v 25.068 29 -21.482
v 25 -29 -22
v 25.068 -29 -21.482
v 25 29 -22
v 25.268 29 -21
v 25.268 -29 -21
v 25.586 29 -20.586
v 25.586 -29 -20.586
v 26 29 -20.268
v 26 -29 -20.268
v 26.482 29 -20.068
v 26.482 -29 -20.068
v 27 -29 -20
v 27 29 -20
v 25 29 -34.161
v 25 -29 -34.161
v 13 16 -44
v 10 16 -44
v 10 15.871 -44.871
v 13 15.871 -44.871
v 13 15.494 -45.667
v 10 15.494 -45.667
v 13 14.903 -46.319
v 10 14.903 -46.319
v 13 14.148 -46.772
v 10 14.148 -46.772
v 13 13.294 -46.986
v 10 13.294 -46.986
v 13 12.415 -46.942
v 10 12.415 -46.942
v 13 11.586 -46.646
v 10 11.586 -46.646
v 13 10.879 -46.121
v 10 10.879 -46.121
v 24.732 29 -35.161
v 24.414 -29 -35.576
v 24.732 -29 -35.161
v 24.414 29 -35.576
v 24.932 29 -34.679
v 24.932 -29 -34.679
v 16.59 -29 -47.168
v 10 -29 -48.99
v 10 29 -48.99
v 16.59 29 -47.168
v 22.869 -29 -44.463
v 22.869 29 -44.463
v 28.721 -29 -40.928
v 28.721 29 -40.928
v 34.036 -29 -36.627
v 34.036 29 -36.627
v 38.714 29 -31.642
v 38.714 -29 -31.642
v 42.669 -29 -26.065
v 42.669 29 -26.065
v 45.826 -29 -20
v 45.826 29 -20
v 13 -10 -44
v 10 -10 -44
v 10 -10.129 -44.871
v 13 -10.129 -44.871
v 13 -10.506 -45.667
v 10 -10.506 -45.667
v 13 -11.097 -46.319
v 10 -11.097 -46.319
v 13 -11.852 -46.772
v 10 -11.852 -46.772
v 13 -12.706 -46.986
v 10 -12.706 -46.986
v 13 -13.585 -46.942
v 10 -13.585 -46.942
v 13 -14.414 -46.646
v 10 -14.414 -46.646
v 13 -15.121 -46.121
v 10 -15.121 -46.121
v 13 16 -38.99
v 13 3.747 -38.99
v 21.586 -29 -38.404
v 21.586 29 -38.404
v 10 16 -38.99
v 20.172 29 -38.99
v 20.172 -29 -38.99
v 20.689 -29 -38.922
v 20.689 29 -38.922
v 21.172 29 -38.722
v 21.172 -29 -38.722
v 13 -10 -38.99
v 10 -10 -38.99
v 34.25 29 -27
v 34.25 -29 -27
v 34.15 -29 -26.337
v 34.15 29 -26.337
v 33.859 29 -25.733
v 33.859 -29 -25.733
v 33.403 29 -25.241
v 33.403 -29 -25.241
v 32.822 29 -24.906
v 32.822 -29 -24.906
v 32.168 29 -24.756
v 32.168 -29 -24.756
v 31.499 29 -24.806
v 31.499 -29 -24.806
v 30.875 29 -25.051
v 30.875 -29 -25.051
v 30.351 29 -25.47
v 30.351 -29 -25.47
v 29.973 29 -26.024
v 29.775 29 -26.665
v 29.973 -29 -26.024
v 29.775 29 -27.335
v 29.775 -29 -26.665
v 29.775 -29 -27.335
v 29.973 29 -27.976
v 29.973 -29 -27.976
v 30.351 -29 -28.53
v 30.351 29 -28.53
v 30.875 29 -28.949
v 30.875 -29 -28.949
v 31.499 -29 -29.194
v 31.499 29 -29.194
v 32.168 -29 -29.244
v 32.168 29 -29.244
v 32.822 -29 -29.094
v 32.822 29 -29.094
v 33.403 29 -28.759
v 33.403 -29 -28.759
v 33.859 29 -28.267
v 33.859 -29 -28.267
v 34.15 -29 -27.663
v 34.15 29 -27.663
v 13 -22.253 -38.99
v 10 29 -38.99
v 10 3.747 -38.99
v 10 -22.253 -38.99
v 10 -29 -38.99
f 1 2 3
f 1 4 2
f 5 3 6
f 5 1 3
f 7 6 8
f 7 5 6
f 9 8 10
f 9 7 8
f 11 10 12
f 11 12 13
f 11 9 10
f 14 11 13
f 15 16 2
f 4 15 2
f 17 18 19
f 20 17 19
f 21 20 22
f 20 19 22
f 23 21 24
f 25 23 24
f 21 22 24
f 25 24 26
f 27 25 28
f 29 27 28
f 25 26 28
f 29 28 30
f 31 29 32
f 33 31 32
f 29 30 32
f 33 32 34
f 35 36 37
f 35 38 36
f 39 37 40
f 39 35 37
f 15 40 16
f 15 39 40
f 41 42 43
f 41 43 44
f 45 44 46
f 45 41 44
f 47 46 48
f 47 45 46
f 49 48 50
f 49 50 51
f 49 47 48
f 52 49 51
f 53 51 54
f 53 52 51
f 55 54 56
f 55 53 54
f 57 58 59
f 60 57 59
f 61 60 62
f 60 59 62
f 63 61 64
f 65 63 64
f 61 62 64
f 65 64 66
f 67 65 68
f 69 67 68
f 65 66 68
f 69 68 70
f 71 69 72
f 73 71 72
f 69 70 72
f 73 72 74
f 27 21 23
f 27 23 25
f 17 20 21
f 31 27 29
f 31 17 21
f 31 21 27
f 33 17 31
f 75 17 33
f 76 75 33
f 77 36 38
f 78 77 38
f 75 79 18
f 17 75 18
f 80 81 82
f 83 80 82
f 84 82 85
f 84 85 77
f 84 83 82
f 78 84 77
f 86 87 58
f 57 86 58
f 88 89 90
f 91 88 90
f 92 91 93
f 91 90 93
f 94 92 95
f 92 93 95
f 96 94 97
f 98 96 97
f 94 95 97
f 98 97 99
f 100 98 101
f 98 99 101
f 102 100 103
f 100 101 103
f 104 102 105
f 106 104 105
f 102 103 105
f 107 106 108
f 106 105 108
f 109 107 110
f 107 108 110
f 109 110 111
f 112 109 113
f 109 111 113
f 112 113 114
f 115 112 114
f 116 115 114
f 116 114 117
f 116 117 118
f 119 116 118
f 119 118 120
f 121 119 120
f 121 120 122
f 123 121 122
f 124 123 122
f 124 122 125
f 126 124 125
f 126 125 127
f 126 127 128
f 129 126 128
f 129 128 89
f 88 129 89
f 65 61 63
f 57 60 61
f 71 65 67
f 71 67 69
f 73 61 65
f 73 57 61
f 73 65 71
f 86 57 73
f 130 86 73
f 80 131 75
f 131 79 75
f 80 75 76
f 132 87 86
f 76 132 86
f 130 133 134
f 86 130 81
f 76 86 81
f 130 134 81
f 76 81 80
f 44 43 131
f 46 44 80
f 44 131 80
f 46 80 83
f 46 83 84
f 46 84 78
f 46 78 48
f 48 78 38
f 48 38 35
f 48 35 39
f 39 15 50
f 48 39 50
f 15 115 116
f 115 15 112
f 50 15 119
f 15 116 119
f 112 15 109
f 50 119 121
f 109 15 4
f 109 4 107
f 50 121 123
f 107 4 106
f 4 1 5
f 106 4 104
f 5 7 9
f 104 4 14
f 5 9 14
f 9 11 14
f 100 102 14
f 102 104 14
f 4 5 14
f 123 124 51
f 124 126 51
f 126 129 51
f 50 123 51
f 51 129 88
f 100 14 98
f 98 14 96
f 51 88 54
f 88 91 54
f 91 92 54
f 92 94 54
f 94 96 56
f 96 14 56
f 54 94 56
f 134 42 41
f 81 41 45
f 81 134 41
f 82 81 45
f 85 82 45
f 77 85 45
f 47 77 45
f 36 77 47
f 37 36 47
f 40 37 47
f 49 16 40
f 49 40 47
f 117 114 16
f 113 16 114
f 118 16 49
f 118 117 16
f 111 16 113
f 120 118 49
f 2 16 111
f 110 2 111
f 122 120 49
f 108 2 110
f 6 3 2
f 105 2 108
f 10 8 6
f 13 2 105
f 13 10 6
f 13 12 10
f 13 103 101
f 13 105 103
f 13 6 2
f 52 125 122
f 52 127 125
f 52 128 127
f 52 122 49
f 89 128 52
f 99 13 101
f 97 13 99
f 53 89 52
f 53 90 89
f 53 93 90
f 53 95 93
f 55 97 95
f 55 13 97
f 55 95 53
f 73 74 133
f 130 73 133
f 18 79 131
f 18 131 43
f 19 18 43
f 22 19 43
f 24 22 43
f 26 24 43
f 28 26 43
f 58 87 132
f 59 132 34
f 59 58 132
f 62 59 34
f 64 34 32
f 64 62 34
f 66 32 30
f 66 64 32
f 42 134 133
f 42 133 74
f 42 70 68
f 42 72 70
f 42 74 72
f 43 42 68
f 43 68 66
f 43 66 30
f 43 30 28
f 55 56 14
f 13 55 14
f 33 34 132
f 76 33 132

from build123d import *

# Parameters (mm, degrees)
F1_DEPTH = 29
F2_W     = 15
F2_H     = 18.9897948557
F3_DEPTH = 58.001
F4_SIZE  = 4
F6_DEPTH = 3
F7_R     = 2.25
F8_DEPTH = 58.001
F9_R     = 2


with BuildPart() as f1:
    # F0 (on Front) → F1 (new body, symmetric)
    with BuildSketch(Plane.XZ):
        with BuildLine():
            Line((10, -20), (10, -48.9897948557))
            ThreePointArc((10, -48.9897948557), (31.4520402548, -38.8686141226), (45.8257569496, -20))
            Line((45.8257569496, -20), (10, -20))
        make_face()
    extrude(amount=F1_DEPTH, both=True)

    # F2 (on face) → F3 (cut, through all)
    with BuildSketch(Plane.XZ.offset(29)):
        with Locations((17.5, -29.4948974278)):
            Rectangle(F2_W, F2_H)
    extrude(amount=-F3_DEPTH, mode=Mode.SUBTRACT)

    # F4
    f4_edges = [f1.edges().sort_by_distance(p)[0] for p in [
        (25, 0, -38.989795),
    ]]
    chamfer(f4_edges, length=F4_SIZE)

    # F5 (on face) → F6 (cut)
    with BuildSketch(Plane(origin=(10, 0, 0), x_dir=(0, -1, 0), z_dir=(-1, 0, 0))):
        with BuildLine():
            Line((-16, -38.9897948557), (-16, -44))
            ThreePointArc((-16, -44), (-14.1480502971, -46.7716385975), (-10.8786796564, -46.1213203436))
            Line((-10.8786796564, -46.1213203436), (-3.7471541685, -38.9897948557))
            Line((-3.7471541685, -38.9897948557), (-16, -38.9897948557))
        make_face()
        with BuildLine():
            Line((10, -38.9897948557), (10, -44))
            ThreePointArc((10, -44), (11.8519497029, -46.7716385975), (15.1213203436, -46.1213203436))
            Line((15.1213203436, -46.1213203436), (22.2528458315, -38.9897948557))
            Line((22.2528458315, -38.9897948557), (10, -38.9897948557))
        make_face()
    extrude(amount=-F6_DEPTH, mode=Mode.SUBTRACT)

    # F7 (on face) → F8 (cut, through all)
    with BuildSketch(Plane.XZ.offset(29)):
        with Locations((32, -27)):
            Circle(F7_R)
    extrude(amount=-F8_DEPTH, mode=Mode.SUBTRACT)

    # F9
    f9_edges = [f1.edges().sort_by_distance(p)[0] for p in [
        (25, 0, -20),
        (25, 0, -34.989795),
        (21, 0, -38.989795),
    ]]
    fillet(f9_edges, radius=F9_R)


solid = f1.part
